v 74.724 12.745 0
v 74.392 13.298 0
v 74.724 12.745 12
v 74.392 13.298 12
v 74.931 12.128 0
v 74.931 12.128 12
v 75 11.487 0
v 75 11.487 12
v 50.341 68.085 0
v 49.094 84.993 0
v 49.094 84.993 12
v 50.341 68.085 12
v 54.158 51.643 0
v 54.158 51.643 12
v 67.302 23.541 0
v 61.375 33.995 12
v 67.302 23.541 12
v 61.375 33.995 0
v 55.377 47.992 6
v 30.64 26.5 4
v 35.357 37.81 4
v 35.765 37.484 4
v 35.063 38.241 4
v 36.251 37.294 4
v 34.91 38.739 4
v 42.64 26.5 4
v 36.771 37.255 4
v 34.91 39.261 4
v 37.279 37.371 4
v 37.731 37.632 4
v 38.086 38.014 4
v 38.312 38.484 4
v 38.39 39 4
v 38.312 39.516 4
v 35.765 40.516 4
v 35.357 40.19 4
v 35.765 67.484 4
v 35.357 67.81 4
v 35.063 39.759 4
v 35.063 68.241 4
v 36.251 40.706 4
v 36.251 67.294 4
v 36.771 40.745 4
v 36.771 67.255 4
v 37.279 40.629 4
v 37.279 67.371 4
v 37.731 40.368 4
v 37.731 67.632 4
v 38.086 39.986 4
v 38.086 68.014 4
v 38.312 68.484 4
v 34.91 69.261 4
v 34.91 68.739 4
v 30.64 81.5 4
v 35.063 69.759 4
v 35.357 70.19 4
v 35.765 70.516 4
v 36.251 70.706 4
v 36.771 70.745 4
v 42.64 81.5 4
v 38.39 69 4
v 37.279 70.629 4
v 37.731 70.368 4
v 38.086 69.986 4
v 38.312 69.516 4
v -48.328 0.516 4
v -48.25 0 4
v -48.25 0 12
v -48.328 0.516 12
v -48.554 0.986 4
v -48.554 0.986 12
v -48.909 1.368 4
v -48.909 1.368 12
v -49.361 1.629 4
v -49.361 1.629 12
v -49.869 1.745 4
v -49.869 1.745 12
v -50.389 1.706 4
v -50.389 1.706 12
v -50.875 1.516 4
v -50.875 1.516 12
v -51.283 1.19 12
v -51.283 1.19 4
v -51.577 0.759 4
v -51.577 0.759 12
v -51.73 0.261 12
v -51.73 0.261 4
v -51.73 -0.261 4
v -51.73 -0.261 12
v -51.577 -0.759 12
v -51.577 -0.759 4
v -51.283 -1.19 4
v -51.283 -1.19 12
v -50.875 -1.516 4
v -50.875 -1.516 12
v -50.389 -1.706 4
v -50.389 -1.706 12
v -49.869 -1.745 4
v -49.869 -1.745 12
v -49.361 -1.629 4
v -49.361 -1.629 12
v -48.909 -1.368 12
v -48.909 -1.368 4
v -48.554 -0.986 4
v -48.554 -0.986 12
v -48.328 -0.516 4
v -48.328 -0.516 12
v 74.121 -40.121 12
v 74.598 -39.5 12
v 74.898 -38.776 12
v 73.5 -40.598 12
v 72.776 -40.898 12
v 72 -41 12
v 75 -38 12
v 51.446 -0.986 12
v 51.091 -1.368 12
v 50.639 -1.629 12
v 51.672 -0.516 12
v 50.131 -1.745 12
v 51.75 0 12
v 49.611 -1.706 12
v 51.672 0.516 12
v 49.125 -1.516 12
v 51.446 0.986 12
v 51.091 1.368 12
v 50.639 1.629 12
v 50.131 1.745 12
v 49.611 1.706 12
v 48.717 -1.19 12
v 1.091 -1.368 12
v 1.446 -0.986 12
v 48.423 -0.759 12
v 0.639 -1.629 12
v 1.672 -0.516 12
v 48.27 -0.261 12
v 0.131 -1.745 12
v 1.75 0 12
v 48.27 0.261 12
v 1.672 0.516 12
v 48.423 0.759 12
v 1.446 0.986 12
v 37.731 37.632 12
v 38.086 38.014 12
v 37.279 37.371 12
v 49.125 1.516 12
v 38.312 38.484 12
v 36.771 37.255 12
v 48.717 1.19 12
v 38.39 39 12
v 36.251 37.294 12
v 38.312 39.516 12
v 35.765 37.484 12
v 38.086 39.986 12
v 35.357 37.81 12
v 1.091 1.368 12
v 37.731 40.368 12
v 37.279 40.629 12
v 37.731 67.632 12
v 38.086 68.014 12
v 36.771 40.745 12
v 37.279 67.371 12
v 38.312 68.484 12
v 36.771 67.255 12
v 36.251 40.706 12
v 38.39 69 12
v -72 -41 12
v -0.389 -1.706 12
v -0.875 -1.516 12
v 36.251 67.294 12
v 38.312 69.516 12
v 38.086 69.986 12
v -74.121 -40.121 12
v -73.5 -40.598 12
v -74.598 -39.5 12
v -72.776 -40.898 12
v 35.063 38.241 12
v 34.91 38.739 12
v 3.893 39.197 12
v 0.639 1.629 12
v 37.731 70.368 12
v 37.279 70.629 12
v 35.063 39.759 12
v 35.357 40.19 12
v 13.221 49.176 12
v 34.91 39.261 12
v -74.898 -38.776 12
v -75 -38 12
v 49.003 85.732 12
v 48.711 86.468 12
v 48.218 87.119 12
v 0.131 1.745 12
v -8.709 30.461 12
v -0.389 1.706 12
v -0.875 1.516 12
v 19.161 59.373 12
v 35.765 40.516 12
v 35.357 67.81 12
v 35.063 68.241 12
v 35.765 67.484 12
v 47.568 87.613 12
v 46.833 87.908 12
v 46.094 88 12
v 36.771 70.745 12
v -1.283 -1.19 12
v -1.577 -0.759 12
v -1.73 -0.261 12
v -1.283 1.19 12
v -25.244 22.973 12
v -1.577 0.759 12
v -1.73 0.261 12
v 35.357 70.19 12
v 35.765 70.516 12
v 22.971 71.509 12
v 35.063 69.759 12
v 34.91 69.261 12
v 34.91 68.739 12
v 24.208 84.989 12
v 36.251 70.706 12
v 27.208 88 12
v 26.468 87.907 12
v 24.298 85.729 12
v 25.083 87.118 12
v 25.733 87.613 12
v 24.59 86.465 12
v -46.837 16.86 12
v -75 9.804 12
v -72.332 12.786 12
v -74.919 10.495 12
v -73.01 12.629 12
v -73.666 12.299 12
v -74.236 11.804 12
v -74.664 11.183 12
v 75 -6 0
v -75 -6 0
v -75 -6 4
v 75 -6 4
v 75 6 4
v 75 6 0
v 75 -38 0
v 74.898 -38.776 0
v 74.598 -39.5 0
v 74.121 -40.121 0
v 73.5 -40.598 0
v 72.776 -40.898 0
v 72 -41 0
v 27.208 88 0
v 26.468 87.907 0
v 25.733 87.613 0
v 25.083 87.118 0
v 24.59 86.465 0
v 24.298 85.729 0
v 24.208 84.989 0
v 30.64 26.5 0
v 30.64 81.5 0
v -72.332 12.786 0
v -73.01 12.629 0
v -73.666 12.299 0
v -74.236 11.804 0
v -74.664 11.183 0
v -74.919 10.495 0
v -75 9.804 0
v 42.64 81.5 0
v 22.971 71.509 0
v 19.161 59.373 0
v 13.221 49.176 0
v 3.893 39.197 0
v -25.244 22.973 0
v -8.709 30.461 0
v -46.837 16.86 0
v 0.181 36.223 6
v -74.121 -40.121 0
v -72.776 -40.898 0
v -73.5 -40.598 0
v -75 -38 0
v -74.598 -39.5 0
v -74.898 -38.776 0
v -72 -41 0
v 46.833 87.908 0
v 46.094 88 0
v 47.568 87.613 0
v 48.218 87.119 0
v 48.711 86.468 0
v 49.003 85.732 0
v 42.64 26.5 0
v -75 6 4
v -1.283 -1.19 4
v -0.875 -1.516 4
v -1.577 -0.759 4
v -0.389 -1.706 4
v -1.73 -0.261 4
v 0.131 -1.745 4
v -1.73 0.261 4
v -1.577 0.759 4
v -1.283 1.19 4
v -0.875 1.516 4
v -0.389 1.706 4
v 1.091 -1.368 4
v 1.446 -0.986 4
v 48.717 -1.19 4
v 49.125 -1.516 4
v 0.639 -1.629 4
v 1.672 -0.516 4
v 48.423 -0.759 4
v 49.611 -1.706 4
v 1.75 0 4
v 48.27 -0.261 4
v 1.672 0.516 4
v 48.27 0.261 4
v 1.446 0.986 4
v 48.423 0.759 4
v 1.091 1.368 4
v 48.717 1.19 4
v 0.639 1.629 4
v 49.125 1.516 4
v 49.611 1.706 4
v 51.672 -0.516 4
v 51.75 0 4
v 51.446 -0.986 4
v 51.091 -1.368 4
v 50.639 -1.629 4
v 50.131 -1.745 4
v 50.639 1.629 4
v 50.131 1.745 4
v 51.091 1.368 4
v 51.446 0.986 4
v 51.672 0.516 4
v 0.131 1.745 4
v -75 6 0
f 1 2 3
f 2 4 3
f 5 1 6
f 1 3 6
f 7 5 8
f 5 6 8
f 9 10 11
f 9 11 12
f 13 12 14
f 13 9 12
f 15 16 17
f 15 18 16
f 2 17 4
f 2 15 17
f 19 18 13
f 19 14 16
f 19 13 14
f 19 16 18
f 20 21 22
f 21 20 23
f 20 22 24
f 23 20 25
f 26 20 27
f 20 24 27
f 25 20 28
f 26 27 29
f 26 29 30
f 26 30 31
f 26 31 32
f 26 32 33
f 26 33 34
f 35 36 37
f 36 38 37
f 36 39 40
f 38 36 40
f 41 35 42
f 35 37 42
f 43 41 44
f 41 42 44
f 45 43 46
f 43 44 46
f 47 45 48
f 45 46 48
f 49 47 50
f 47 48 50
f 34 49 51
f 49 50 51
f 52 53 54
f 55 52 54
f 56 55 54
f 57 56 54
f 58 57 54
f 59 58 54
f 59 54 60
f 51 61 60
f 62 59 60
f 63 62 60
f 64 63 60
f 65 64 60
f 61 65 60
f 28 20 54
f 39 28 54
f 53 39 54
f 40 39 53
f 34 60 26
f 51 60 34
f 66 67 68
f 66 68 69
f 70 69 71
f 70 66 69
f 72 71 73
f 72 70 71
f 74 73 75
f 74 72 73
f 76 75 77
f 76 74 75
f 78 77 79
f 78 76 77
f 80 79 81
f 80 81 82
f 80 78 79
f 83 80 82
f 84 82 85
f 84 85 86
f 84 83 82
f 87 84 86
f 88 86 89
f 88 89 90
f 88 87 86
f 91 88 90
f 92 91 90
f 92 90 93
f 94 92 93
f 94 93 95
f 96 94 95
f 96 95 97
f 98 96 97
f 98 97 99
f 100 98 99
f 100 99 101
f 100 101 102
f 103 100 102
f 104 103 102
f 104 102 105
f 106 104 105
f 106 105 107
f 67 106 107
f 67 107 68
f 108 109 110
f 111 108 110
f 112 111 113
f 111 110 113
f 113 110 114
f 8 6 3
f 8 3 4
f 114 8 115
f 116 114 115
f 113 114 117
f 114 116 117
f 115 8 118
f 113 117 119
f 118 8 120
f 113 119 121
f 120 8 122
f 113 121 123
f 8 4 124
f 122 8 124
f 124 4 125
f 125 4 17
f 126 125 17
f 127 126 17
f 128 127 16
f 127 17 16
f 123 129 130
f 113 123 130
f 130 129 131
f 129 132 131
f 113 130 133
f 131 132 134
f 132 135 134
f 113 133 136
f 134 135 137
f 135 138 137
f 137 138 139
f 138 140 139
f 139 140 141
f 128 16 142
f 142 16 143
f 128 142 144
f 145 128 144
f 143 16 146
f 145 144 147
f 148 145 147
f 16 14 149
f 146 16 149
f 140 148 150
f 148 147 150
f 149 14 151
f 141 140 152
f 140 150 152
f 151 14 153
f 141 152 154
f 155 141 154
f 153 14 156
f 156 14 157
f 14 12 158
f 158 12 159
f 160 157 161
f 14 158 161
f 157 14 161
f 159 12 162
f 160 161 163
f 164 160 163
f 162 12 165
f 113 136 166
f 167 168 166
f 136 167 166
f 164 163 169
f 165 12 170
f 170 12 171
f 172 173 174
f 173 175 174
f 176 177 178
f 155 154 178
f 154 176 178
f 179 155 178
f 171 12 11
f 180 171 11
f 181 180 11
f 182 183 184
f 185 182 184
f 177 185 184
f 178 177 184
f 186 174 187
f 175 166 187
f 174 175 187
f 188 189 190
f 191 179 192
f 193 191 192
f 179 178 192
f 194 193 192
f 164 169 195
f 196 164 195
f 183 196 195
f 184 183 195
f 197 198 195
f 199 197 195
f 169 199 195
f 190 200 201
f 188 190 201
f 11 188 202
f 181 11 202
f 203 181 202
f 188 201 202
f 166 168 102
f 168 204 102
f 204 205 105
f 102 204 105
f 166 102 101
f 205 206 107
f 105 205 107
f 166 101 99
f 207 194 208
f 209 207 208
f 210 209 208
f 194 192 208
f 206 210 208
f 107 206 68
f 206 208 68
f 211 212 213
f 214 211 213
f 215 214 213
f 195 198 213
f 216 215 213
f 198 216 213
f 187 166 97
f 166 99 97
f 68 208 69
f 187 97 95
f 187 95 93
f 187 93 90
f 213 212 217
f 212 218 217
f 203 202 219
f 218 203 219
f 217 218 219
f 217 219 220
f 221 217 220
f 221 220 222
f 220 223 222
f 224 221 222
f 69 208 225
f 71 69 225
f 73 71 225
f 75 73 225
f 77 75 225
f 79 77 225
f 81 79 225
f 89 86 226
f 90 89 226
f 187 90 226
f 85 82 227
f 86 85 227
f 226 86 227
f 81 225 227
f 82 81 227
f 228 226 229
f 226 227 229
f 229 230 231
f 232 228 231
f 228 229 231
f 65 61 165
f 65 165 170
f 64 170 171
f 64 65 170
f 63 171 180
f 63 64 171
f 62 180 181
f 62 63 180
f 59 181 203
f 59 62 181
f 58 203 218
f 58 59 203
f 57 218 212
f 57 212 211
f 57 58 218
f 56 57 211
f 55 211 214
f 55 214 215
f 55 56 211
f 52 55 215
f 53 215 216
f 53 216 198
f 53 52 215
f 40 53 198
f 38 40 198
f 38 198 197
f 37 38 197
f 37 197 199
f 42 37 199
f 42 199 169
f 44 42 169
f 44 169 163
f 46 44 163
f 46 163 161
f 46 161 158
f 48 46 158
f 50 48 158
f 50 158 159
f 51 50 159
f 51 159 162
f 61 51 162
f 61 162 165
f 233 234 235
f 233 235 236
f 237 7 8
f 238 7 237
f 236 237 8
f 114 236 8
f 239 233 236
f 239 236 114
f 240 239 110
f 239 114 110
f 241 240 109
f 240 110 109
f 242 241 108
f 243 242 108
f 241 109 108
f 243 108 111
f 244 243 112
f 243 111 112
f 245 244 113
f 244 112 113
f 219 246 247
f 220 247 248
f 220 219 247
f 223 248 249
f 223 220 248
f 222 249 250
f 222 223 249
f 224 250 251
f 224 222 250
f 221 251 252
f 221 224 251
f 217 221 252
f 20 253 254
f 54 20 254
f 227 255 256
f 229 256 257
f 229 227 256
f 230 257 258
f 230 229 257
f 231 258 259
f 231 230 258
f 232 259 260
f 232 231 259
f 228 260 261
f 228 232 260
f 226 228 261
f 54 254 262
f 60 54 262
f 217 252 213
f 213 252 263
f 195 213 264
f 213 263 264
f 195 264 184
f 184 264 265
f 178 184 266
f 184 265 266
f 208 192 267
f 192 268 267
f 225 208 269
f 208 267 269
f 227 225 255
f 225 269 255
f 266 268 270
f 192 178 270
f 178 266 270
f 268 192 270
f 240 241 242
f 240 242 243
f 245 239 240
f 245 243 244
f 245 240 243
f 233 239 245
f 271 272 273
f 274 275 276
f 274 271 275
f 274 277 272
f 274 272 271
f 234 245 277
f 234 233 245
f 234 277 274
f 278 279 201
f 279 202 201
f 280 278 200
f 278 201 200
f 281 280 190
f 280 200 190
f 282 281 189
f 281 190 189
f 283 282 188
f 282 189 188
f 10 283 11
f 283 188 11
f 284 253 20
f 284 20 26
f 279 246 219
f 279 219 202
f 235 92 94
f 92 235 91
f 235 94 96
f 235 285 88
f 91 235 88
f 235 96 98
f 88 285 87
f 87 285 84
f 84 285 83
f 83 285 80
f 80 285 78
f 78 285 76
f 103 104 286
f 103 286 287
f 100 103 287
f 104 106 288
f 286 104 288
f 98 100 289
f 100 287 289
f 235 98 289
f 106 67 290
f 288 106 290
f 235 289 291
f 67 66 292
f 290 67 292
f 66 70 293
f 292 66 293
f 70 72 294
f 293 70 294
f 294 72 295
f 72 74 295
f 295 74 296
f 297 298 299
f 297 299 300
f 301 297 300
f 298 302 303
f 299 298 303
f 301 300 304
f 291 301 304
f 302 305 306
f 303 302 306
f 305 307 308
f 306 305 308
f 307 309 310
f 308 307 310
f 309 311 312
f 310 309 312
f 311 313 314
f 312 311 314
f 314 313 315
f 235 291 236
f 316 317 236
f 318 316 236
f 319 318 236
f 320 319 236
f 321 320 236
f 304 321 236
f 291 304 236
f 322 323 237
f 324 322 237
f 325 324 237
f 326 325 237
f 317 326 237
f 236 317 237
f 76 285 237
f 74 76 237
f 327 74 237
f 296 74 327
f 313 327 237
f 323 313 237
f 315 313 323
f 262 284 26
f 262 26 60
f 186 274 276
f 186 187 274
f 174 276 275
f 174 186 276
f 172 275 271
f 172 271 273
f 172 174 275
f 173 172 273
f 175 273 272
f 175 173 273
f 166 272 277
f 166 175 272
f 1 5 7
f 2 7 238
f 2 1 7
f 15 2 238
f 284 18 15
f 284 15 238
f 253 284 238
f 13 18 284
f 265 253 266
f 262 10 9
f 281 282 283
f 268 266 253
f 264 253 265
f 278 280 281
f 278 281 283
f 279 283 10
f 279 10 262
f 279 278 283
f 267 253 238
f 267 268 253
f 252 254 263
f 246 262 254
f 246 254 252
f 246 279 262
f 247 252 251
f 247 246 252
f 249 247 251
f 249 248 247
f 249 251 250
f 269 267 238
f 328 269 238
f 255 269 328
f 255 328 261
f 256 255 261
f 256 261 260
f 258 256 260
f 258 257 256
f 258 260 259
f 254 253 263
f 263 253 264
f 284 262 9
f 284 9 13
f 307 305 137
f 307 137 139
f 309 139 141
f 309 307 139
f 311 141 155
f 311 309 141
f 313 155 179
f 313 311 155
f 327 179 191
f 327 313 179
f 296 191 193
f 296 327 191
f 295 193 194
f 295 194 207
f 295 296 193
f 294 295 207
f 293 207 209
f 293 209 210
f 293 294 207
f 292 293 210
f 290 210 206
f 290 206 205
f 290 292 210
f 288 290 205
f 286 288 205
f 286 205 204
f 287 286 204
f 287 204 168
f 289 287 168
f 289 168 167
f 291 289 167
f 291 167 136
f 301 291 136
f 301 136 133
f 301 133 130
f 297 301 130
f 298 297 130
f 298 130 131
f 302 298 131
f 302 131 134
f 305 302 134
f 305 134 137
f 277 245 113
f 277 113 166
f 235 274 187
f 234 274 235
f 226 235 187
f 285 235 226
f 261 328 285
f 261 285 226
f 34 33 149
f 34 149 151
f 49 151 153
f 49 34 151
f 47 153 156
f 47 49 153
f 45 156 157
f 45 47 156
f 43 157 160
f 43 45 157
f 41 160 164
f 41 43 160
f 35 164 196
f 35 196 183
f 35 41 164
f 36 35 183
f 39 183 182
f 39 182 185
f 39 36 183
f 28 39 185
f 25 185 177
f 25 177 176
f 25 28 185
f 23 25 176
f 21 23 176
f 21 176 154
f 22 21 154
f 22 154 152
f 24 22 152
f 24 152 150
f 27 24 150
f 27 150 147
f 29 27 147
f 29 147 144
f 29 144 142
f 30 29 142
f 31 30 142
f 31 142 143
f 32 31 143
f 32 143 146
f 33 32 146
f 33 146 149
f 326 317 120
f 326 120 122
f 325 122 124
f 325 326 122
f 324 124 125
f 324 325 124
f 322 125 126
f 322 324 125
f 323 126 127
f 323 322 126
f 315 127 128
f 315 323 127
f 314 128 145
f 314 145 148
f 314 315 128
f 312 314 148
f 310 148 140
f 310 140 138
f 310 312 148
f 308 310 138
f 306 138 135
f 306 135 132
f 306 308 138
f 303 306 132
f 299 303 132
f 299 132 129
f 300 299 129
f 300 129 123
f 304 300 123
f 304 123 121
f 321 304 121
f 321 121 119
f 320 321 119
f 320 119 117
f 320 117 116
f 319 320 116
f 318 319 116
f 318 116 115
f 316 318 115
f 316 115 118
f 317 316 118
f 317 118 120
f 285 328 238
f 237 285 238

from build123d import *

# Parameters (mm, degrees)
SKIZZE1_R                       = 1.75
AUFSATZ_LINEAR_AUSTRAGEN1_DEPTH = 12
SKIZZE1_4_W                     = 150
SKIZZE1_4_H                     = 12
SKIZZE1_4_W_2                   = 12
SKIZZE1_4_H_2                   = 55
SKIZZE1_4_R                     = 1.75
SCHNITT_LINEAR_AUSTRAGEN2_DEPTH = 4
VERRUNDUNG1_R                   = 3


with BuildPart() as part:
    # Skizze1 → Aufsatz-Linear austragen1 (new body)
    with BuildSketch(Plane.XY):
        with BuildLine():
            Line((49.14, 88), (24.14, 88))
            add(Edge.make_bspline(
                [(24.14, 88), (26.807525043, 22.962561466), (-75, 12.5)],
                knots=[0, 0, 0, 1, 1, 1], degree=2))
            Line((-75, 12.5), (-75, -41))
            Line((-75, -41), (75, -41))
            Line((75, -41), (75, 12.5))
            add(Edge.make_bspline(
                [(49.14, 88), (47.999428855, 47.699903884), (75, 12.5)],
                knots=[0, 0, 0, 1, 1, 1], degree=2))
        make_face()
        with Locations((50, 0)):
            Circle(SKIZZE1_R, mode=Mode.SUBTRACT)
        with Locations((-50, 0)):
            Circle(SKIZZE1_R, mode=Mode.SUBTRACT)
        Circle(SKIZZE1_R, mode=Mode.SUBTRACT)
        with Locations((36.64, 39)):
            Circle(SKIZZE1_R, mode=Mode.SUBTRACT)
        with Locations((36.64, 69)):
            Circle(SKIZZE1_R, mode=Mode.SUBTRACT)
    extrude(amount=AUFSATZ_LINEAR_AUSTRAGEN1_DEPTH)

    # Skizze1<4> → Schnitt-Linear austragen2 (cut)
    # profile 1 of 2: a face of its own
    with BuildSketch(Plane.XY):
        Rectangle(SKIZZE1_4_W, SKIZZE1_4_H)
    # profile 2 of 2: a face of its own
    with BuildSketch(Plane.XY):
        with Locations((36.64, 54)):
            Rectangle(SKIZZE1_4_W_2, SKIZZE1_4_H_2)
        with Locations((36.64, 39)):
            Circle(SKIZZE1_4_R, mode=Mode.SUBTRACT)
        with Locations((36.64, 69)):
            Circle(SKIZZE1_4_R, mode=Mode.SUBTRACT)
    extrude(amount=SCHNITT_LINEAR_AUSTRAGEN2_DEPTH, mode=Mode.SUBTRACT)

    # Verrundung1
    verrundung1_edges = [part.edges().sort_by_distance(p)[0] for p in [
        (75, -41, 6),
        (75, 12.5, 6),
        (49.14, 88, 6),
        (-75, -41, 6),
        (-75, 12.5, 6),
        (24.14, 88, 6),
    ]]
    fillet(verrundung1_edges, radius=VERRUNDUNG1_R)


solid = part.part
